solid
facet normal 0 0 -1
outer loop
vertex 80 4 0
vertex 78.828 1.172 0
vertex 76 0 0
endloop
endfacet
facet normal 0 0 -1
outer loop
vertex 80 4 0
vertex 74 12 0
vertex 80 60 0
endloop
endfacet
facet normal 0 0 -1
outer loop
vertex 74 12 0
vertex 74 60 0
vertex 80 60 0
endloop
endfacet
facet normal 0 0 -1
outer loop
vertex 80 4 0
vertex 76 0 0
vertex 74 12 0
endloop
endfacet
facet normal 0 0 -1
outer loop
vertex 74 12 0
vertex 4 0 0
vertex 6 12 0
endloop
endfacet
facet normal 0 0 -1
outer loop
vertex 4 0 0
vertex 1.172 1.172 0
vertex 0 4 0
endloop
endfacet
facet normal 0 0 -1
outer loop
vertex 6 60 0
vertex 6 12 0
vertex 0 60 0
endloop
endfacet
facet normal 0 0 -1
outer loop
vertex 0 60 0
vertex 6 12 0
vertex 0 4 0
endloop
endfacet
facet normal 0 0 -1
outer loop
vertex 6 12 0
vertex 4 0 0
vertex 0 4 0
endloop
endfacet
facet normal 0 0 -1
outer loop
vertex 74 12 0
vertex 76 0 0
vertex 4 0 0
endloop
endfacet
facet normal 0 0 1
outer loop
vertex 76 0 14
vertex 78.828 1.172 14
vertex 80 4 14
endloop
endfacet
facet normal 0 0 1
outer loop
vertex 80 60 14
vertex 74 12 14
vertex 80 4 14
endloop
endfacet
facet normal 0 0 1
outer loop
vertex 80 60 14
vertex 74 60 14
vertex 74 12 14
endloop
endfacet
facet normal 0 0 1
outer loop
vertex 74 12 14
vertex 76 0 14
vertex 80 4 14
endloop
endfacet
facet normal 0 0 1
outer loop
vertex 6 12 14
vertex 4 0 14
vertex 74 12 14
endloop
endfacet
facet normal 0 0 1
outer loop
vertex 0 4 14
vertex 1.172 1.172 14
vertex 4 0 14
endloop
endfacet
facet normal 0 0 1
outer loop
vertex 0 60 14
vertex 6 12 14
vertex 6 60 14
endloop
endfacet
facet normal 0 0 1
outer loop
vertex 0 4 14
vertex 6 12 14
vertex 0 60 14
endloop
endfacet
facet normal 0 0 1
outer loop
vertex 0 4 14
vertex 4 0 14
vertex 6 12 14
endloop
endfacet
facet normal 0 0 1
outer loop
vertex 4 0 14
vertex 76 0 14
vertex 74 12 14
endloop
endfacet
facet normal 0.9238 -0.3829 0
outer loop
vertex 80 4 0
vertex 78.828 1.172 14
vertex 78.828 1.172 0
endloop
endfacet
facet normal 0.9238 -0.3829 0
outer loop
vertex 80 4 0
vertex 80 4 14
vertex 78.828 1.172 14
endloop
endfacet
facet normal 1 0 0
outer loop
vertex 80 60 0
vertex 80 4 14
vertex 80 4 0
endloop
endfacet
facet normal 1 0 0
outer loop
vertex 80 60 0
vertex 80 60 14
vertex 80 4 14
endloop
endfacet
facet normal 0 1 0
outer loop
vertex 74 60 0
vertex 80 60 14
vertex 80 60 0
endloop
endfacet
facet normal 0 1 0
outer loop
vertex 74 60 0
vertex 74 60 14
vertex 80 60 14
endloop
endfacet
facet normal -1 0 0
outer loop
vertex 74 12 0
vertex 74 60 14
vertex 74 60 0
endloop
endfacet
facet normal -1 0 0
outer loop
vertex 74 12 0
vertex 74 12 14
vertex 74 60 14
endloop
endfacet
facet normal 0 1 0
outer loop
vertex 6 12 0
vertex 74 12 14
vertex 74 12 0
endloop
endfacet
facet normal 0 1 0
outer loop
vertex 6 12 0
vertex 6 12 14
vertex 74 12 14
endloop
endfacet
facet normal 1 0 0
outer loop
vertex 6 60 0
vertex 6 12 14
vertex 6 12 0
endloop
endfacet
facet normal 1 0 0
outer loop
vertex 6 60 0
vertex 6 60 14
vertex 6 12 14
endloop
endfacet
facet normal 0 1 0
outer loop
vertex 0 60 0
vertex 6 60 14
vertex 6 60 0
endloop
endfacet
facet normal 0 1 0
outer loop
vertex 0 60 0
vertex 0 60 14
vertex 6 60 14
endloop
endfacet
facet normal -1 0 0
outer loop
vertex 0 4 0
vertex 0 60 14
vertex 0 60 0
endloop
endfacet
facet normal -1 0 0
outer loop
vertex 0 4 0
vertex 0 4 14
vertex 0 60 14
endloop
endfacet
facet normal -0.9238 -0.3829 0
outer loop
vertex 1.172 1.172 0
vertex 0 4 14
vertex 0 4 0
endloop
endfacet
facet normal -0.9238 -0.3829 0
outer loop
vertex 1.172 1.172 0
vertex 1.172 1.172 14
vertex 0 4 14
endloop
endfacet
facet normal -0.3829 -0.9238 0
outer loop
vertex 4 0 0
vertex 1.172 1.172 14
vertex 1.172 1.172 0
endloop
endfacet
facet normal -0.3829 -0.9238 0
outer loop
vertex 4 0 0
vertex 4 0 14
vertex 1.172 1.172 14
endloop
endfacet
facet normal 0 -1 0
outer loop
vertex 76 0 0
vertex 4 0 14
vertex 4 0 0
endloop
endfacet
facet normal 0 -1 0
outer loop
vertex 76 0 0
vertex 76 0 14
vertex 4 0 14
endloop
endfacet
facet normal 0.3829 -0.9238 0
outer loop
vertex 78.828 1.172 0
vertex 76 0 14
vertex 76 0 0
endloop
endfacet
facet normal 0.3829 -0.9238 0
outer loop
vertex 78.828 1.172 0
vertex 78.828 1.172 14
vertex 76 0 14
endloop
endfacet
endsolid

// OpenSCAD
$fn = 32;

// ----------------------------------------------------------------------
// Heat sink frame: 80 x 60 mm frame, 6 mm walls
// ----------------------------------------------------------------------

// --- parameters (mm) ---
profile_height = 14;      // extrusion height
profile_points = 12;      // points of the closed outline

profile = [[0, 4], [1.172, 1.172], [4, 0], [76, 0], [78.828, 1.172], [80, 4], [80, 60], [74, 60], [74, 12], [6, 12], [6, 60], [0, 60]];  // single closed polygon, 12 points, counter clockwise

// --- the one profile operation ---
linear_extrude(height = profile_height) polygon(points = profile);
